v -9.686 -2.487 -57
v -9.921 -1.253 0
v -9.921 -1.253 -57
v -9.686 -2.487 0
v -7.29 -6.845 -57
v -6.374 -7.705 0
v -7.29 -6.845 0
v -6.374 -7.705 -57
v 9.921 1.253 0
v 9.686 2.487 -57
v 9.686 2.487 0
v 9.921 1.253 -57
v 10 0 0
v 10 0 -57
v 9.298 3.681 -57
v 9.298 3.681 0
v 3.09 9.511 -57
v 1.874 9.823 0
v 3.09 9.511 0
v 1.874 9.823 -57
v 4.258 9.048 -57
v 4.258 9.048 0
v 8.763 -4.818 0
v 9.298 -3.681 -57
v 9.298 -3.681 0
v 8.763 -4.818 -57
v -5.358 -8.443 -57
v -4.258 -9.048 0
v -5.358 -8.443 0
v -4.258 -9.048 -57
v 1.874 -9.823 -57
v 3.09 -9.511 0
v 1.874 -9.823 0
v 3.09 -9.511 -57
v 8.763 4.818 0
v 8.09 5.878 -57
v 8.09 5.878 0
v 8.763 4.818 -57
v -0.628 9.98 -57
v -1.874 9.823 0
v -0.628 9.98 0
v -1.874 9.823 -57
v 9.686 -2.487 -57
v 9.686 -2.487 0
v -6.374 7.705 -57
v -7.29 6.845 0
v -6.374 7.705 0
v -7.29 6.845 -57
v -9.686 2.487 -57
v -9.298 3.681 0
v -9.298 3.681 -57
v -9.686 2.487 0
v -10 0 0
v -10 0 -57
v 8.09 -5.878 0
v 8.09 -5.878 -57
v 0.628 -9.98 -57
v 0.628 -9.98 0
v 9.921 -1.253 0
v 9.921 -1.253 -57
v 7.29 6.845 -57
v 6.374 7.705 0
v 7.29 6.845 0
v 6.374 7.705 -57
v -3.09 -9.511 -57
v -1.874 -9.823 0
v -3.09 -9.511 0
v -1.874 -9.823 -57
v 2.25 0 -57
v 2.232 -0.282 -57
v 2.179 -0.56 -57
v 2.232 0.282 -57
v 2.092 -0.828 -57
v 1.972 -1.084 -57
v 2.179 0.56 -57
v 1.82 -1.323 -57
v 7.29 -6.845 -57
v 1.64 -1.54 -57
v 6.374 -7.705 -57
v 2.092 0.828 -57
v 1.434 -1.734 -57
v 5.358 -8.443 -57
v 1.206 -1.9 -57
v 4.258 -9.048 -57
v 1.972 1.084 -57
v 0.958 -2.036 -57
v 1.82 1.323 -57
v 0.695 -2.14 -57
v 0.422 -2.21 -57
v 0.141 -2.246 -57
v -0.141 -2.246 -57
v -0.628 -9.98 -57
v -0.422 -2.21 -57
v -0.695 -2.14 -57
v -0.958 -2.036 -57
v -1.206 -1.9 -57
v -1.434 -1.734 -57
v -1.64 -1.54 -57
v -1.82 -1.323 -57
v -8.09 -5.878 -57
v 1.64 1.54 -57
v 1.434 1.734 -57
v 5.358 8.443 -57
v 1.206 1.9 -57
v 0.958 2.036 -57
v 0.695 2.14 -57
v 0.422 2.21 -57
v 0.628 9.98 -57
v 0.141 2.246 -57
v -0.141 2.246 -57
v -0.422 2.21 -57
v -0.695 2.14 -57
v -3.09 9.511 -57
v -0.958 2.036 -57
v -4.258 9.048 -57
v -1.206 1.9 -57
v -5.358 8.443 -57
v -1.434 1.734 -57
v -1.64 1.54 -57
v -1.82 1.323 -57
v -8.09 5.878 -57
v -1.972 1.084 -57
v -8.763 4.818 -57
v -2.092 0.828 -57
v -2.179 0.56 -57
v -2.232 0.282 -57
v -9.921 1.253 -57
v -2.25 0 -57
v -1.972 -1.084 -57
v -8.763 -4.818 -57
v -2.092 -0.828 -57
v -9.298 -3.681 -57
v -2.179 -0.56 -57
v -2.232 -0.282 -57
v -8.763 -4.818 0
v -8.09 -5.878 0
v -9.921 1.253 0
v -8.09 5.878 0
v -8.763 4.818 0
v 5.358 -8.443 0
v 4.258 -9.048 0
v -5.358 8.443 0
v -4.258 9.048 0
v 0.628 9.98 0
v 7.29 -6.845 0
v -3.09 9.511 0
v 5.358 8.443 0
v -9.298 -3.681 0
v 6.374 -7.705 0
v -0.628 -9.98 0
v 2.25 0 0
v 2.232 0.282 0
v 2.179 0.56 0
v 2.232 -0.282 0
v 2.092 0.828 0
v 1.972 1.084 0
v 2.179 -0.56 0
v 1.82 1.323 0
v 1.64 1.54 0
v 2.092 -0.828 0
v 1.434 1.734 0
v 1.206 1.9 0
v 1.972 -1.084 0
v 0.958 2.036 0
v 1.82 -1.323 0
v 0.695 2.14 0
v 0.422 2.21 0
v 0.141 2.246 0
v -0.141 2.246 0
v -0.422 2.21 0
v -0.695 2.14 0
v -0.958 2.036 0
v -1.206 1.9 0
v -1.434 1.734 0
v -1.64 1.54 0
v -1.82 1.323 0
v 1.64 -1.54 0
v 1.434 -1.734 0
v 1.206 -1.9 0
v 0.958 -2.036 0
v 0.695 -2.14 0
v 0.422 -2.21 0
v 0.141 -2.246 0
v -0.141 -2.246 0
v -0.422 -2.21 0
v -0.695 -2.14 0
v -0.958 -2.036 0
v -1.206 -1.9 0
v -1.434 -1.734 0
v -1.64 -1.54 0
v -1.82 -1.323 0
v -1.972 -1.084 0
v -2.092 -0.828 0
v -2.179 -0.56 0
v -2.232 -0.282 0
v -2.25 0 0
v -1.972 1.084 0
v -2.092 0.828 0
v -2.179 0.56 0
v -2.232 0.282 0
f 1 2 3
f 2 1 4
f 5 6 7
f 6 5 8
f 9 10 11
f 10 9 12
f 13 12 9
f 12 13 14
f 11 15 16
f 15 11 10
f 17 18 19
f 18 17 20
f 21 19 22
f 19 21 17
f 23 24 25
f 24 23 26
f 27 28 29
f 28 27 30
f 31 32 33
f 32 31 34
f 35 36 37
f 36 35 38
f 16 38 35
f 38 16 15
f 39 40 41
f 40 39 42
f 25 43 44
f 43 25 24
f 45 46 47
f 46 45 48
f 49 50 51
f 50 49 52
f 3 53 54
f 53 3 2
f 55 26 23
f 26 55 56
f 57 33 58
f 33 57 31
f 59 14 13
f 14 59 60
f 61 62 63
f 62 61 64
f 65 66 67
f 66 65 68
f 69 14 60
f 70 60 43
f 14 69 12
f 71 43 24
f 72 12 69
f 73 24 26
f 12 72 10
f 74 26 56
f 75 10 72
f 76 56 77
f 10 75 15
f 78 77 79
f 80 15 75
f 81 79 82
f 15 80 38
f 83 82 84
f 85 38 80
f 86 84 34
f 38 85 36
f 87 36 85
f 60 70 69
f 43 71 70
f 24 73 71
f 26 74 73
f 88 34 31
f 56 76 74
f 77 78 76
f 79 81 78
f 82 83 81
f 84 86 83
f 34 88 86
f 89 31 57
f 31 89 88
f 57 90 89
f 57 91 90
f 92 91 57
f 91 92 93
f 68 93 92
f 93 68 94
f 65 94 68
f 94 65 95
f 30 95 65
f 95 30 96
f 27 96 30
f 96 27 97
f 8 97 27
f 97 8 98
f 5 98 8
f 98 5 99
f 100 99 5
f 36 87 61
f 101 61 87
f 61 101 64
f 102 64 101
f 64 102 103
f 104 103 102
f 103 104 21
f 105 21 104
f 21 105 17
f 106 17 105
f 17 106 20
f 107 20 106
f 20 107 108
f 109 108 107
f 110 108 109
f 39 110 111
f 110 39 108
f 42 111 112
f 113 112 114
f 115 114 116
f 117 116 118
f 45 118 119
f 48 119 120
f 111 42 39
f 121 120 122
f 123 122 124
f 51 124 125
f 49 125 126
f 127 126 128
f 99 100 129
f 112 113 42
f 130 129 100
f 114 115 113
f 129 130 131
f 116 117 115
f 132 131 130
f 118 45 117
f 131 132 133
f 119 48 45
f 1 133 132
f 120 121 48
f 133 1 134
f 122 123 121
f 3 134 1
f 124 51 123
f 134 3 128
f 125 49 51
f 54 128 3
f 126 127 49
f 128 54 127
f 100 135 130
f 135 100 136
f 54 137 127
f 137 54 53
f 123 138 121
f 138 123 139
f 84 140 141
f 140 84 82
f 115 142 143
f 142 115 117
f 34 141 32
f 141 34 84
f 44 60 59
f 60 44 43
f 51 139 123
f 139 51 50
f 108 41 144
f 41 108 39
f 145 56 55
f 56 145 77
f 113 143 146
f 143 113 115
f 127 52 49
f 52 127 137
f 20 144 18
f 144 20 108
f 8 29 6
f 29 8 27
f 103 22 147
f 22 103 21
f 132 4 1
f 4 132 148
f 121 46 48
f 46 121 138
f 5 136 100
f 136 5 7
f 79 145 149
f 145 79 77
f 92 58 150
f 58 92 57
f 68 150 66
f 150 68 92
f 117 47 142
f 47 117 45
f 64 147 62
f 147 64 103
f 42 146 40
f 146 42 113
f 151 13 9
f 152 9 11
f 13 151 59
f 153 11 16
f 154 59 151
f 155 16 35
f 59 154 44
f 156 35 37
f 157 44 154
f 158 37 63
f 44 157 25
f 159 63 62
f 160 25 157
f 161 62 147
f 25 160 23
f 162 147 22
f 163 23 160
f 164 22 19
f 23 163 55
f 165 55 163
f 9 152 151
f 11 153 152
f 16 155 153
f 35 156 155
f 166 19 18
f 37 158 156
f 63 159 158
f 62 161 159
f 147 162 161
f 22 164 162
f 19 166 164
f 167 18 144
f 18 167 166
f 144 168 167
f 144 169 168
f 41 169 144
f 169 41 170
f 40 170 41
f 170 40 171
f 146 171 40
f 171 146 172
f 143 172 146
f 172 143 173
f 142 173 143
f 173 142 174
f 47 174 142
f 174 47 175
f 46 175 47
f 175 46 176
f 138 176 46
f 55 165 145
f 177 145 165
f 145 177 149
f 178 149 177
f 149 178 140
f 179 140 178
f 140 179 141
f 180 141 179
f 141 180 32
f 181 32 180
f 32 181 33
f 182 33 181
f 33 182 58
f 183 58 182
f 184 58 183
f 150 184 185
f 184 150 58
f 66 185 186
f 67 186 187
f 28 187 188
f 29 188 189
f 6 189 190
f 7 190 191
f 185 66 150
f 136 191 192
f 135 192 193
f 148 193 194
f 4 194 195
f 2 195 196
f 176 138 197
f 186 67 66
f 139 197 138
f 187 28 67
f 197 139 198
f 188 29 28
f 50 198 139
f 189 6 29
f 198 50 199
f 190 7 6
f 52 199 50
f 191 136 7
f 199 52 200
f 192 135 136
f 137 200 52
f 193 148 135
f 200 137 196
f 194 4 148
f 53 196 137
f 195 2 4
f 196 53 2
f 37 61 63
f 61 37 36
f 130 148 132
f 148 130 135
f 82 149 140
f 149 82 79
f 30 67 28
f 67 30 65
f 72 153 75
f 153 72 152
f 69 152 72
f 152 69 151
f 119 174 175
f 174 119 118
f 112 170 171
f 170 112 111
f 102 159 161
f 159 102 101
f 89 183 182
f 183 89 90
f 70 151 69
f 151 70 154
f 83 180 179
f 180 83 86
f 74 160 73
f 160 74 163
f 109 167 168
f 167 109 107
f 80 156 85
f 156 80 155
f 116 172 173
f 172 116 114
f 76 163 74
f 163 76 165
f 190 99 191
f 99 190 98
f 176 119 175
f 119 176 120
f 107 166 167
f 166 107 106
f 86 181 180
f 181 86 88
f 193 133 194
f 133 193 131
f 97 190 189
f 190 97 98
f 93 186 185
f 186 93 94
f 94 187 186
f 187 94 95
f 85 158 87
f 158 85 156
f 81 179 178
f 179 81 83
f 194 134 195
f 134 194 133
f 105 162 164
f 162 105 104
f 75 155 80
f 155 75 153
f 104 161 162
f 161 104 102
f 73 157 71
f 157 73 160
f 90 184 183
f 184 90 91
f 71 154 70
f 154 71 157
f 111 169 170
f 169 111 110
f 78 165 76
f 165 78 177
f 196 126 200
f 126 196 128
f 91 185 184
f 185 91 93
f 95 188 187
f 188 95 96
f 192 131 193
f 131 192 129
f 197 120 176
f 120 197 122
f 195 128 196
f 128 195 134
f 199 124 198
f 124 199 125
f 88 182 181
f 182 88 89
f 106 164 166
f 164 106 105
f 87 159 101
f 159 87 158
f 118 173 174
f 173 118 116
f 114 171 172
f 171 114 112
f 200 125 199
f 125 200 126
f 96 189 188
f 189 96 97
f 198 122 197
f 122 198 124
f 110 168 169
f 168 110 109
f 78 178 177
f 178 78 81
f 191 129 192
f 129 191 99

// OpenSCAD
$fn = 50;


difference() {
	union() {
		translate(v = [0, 0, -57.0000000000]) {
			cylinder(h = 57, r = 10.0000000000);
		}
		cylinder(h = 0, r = 20.0000000000);
	}
	union() {
		#translate(v = [0, 0, -57]) {
			cylinder(h = 57, r = 2.2500000000);
		}
	}
}
